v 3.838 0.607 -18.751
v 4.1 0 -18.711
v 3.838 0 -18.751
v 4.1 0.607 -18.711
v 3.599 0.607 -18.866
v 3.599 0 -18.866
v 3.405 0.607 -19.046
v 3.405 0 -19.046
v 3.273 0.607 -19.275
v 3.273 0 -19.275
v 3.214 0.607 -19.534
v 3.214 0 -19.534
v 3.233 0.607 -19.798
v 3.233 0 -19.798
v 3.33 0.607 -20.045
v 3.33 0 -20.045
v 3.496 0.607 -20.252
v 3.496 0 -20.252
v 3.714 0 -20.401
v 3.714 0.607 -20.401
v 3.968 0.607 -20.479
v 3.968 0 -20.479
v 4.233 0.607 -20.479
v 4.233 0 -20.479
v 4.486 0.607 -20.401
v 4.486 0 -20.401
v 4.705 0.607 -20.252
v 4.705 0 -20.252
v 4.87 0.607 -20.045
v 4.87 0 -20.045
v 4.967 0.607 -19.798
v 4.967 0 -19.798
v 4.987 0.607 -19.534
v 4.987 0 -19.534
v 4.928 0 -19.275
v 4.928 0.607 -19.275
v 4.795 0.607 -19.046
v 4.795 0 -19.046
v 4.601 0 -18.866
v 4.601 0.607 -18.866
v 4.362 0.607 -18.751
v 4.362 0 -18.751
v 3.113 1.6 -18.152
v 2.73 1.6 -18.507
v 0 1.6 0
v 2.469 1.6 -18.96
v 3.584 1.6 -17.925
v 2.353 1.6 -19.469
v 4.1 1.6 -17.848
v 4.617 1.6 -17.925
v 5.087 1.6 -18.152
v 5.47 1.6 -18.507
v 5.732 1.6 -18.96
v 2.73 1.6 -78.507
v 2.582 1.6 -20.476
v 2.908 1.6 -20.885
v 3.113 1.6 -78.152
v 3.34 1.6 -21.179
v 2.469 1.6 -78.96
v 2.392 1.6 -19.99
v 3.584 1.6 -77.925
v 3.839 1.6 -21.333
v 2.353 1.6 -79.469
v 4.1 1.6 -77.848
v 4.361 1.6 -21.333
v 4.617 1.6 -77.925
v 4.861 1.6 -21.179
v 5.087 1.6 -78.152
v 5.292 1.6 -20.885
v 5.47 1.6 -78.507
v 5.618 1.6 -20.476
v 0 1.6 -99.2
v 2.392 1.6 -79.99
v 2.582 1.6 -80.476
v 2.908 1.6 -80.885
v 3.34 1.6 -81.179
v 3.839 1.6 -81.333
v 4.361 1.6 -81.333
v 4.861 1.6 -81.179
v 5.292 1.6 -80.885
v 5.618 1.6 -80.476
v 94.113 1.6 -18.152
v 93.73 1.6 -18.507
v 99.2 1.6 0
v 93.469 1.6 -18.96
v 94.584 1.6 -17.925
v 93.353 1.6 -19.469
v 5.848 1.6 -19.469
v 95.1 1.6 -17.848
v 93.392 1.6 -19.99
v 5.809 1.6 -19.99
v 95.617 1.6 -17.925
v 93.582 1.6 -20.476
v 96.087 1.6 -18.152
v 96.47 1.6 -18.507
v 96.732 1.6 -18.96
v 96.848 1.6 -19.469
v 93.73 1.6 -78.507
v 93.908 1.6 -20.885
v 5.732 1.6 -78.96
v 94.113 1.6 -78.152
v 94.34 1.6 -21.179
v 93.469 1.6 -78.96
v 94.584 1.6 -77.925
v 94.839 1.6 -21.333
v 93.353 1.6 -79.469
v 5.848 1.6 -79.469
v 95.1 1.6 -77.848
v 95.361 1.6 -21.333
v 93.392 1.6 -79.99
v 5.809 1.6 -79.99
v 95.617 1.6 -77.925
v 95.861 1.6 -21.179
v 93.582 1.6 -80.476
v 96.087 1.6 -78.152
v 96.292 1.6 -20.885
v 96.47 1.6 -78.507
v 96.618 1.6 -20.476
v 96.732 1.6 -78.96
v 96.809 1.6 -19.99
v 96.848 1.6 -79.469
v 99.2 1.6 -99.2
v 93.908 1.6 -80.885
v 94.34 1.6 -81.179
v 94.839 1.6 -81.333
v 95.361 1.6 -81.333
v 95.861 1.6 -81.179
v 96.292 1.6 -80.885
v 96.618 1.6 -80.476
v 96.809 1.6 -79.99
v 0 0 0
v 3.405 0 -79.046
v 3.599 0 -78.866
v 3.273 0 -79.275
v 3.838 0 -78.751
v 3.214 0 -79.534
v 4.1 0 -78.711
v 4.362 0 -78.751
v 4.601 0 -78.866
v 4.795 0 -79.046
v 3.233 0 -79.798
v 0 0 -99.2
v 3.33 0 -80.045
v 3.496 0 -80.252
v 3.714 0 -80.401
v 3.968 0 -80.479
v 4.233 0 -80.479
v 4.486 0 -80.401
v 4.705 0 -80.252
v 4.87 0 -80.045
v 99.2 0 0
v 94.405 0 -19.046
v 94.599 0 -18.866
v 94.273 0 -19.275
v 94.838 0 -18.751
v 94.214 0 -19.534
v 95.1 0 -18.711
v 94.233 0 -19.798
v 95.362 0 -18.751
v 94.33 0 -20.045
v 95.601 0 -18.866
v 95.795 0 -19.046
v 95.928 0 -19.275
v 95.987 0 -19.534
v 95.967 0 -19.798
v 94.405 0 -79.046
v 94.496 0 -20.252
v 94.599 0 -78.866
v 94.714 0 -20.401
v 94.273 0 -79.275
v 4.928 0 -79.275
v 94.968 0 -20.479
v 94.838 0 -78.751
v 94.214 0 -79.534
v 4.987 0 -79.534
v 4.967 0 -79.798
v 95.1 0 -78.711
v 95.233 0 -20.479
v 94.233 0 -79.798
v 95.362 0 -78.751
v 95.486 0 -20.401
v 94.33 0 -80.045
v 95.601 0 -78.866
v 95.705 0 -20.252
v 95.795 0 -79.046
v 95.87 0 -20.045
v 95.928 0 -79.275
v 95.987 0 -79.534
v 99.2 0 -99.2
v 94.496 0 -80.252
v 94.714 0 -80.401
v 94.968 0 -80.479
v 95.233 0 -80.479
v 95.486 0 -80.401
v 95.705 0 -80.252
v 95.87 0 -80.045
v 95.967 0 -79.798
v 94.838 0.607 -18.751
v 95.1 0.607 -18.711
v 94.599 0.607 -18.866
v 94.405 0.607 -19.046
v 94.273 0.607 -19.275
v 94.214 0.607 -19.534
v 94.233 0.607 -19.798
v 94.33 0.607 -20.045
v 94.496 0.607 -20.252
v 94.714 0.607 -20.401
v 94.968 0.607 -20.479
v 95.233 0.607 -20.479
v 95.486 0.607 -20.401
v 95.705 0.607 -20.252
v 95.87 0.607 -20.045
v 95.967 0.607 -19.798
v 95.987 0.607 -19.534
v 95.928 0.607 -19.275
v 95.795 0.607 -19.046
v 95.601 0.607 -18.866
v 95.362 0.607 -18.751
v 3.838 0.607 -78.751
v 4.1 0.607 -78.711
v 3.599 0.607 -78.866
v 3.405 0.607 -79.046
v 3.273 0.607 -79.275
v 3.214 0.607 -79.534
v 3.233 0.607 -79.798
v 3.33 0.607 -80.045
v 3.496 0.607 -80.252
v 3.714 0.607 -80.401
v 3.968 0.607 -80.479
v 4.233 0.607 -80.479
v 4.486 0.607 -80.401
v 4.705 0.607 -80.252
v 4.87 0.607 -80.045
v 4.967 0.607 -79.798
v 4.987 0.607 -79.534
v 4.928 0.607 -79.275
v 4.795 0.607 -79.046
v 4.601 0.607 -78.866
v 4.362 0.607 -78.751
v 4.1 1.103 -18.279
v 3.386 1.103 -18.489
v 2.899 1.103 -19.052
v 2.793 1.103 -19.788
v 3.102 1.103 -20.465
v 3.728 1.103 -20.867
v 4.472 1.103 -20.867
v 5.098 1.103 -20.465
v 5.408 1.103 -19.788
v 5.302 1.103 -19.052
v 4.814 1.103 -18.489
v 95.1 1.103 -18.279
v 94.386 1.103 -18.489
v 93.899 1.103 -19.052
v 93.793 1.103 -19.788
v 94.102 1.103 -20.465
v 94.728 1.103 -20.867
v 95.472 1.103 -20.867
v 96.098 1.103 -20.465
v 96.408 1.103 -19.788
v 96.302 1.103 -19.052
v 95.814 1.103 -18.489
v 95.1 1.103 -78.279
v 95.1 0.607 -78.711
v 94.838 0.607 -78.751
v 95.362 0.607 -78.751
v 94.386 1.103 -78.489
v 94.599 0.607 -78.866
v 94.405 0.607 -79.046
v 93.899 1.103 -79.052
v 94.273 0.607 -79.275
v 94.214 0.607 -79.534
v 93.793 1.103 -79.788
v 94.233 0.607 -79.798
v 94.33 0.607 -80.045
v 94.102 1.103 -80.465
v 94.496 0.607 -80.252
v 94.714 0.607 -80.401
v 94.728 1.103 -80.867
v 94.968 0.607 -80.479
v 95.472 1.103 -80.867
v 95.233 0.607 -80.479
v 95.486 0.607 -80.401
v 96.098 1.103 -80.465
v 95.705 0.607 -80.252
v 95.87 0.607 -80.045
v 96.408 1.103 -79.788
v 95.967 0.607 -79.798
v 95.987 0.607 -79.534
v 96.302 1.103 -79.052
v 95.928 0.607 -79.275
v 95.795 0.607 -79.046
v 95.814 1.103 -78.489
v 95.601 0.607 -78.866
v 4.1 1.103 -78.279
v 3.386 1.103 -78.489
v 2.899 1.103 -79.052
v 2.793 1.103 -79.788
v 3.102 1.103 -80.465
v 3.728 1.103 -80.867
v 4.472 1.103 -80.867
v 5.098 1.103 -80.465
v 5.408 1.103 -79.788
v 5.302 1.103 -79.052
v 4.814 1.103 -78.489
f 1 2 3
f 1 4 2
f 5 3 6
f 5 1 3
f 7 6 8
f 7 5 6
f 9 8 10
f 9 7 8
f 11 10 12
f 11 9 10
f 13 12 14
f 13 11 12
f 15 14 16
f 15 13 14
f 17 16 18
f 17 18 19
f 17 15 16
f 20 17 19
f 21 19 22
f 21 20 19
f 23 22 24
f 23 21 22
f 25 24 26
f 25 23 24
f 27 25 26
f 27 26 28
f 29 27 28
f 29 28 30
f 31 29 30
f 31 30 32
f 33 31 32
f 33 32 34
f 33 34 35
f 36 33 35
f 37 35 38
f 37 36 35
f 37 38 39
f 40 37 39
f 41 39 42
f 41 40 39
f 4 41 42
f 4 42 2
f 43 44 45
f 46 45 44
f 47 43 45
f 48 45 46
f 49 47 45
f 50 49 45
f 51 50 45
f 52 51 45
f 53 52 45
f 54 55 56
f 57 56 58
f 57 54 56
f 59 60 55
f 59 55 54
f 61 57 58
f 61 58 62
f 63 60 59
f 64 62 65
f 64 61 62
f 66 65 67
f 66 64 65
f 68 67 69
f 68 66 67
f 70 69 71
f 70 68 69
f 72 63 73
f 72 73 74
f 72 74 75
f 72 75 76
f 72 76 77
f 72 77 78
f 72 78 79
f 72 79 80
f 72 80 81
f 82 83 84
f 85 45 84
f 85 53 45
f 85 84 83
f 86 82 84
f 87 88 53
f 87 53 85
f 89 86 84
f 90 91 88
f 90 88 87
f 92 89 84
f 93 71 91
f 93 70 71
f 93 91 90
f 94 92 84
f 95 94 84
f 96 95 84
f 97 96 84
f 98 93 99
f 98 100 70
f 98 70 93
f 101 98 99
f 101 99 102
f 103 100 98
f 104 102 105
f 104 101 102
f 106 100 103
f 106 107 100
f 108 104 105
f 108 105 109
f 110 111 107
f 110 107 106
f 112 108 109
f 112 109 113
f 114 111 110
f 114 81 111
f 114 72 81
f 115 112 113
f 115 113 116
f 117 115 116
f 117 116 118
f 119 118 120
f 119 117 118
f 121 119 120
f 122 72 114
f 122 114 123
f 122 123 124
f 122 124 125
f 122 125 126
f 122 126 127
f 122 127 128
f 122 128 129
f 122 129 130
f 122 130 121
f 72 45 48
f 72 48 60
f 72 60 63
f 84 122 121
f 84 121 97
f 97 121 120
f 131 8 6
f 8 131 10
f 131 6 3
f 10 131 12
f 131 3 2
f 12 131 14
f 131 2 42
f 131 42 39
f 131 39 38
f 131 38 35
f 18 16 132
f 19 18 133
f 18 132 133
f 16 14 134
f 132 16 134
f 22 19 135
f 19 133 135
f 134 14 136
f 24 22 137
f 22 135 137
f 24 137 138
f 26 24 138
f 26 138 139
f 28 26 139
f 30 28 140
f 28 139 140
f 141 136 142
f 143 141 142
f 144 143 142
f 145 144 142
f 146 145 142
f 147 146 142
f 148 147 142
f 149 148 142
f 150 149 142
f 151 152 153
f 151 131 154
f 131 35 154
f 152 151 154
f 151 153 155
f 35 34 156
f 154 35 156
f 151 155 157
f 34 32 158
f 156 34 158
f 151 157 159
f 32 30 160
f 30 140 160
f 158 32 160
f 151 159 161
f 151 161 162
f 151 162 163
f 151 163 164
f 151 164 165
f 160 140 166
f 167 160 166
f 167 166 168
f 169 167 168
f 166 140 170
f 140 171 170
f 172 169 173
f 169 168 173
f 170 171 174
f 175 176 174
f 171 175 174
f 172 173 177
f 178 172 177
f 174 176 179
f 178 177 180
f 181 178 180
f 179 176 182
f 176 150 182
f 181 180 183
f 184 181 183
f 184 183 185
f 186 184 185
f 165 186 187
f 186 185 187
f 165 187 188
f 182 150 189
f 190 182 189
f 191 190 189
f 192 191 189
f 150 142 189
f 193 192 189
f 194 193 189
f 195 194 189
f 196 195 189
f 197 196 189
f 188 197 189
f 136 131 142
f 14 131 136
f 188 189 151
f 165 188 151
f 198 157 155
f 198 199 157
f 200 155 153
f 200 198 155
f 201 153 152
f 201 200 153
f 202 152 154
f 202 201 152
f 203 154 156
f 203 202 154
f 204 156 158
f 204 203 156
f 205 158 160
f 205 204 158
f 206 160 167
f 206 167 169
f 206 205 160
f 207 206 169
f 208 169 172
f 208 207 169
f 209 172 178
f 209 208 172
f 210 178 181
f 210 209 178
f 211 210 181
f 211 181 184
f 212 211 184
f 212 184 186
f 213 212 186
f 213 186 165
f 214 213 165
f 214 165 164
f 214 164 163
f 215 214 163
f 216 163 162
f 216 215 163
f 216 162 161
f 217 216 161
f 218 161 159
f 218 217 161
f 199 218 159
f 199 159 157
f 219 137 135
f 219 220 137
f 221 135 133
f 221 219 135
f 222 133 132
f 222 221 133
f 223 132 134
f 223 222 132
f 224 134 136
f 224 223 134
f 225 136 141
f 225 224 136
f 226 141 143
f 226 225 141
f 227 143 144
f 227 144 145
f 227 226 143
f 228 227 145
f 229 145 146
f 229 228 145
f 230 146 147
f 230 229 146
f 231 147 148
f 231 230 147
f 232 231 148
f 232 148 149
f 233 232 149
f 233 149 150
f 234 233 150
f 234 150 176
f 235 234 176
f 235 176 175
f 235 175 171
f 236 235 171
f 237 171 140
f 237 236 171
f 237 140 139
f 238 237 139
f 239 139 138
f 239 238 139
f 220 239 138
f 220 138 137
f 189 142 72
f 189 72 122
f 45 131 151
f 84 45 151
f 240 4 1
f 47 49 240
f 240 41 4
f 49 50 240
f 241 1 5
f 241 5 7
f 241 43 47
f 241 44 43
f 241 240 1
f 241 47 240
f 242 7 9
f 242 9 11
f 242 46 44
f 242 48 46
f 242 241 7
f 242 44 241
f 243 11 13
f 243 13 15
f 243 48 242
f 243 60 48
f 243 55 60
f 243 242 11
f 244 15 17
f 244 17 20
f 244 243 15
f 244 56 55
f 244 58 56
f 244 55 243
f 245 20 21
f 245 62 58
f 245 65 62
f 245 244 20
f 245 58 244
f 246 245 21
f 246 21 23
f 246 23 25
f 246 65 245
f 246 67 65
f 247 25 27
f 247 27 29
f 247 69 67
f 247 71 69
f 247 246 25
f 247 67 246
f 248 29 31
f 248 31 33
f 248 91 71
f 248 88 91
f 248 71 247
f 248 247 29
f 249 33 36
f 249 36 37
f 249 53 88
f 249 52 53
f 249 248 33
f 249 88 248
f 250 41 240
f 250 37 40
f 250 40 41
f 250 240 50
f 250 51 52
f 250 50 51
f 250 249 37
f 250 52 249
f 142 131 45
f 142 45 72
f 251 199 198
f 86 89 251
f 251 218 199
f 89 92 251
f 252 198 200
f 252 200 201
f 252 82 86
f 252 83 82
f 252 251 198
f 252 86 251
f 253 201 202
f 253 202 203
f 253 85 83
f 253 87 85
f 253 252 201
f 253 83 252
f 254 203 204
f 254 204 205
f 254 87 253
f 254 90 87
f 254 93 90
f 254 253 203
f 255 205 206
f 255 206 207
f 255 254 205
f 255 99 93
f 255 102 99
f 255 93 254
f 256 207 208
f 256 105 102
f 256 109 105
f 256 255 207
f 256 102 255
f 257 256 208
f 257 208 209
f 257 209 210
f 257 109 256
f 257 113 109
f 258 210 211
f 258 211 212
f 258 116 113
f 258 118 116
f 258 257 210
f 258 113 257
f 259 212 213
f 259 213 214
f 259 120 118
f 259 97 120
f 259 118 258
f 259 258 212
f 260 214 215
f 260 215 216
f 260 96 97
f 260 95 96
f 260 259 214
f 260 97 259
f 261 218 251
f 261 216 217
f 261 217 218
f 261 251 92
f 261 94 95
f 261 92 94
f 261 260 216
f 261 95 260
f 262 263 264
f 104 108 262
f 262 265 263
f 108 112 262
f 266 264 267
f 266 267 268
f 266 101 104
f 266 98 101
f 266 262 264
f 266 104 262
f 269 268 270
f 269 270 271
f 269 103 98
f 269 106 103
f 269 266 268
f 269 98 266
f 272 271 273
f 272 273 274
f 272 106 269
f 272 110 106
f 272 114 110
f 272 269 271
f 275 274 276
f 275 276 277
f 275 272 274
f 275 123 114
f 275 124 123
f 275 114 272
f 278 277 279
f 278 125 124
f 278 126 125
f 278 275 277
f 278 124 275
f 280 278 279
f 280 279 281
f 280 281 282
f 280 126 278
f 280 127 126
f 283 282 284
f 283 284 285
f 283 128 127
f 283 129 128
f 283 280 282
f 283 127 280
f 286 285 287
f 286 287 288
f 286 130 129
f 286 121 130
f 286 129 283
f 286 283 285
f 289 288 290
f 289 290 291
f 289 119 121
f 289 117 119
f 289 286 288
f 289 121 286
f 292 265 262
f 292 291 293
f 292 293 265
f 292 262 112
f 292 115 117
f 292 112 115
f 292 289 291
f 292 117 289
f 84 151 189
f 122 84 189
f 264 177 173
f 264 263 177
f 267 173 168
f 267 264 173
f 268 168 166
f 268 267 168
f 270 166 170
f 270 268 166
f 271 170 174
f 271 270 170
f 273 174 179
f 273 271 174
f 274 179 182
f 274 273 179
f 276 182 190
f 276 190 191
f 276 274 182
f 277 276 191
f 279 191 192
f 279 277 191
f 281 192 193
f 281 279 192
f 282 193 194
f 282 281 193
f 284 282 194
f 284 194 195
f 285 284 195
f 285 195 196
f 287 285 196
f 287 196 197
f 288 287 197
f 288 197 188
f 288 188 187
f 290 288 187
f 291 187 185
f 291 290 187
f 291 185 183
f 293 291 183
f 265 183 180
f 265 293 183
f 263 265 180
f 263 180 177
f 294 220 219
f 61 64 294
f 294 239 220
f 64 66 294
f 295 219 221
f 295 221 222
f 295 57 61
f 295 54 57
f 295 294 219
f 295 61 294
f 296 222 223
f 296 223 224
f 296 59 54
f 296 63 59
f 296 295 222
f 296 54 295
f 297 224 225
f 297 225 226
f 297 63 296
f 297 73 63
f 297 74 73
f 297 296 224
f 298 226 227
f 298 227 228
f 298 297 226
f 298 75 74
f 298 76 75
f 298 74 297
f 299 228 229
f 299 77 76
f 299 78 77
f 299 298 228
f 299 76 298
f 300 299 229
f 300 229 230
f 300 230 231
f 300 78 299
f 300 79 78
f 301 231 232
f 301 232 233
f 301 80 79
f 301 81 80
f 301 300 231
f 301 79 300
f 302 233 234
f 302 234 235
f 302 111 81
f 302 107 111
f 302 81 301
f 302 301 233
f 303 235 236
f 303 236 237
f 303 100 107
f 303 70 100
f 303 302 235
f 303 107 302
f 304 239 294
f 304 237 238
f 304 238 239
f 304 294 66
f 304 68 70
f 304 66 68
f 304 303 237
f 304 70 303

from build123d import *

# Parameters (mm, degrees)
SKETCH1_W                                     = 99.2004
SKETCH1_H                                     = 99.2004
BOSS_EXTRUDE1_DEPTH                           = 1.6002
CSK_FOR_0_FLAT_HEAD_SOCKET_CAP_SCREW1_A_COUNT = 2
CSK_FOR_0_FLAT_HEAD_SOCKET_CAP_SCREW1_A_PITCH = 60
CSK_FOR_0_FLAT_HEAD_SOCKET_CAP_SCRE_2_COUNT   = 2
CSK_FOR_0_FLAT_HEAD_SOCKET_CAP_SCRE_2_PITCH   = 109
CSK_FOR_0_FLAT_HEAD_SOCKET_CAP_SCRE_3_COUNT   = 2
CSK_FOR_0_FLAT_HEAD_SOCKET_CAP_SCRE_3_PITCH   = 91


with BuildPart() as part:
    # Sketch1 → Boss-Extrude1 (new body)
    with BuildSketch(Plane(origin=(0, 0, 0), x_dir=(1, 0, 0), z_dir=(0, 1, 0))):
        with Locations((49.6002, 49.6002)):
            Rectangle(SKETCH1_W, SKETCH1_H)
    extrude(amount=BOSS_EXTRUDE1_DEPTH)

    # Sketch5 → CSK for #0 Flat Head Socket Cap Screw1 (revolve, cut)
    with BuildSketch(Plane(origin=(4.1002, 1.6002, -79.6002), x_dir=(0, 0, 1), z_dir=(1, 0, 0))):
        Polygon((0, 0), (0, 1.6002), (0.889, 1.6002), (0.889, 0.993458156), (1.7526, 0), align=None)
    csk_for_0_flat_head_socket_cap_screw1 = revolve(axis=Axis((4.1002, 7.9502, -79.6002), (0, -1, 0)), mode=Mode.SUBTRACT)

    # CSK for #0 Flat Head Socket Cap Screw1 a: CSK for #0 Flat Head Socket Cap Screw1 ×2
    with Locations(*[(0, 0, i * CSK_FOR_0_FLAT_HEAD_SOCKET_CAP_SCREW1_A_PITCH) for i in range(1, CSK_FOR_0_FLAT_HEAD_SOCKET_CAP_SCREW1_A_COUNT)]):
        add(csk_for_0_flat_head_socket_cap_screw1, mode=Mode.SUBTRACT)

    # CSK for _0 Flat Head Socket Cap Scre 2: CSK for #0 Flat Head Socket Cap Screw1 ×2
    with Locations(*[Vector(0.834862385, 0, 0.550458716) * (i * CSK_FOR_0_FLAT_HEAD_SOCKET_CAP_SCRE_2_PITCH) for i in range(1, CSK_FOR_0_FLAT_HEAD_SOCKET_CAP_SCRE_2_COUNT)]):
        add(csk_for_0_flat_head_socket_cap_screw1, mode=Mode.SUBTRACT)

    # CSK for _0 Flat Head Socket Cap Scre 3: CSK for #0 Flat Head Socket Cap Screw1 ×2
    with Locations(*[(i * CSK_FOR_0_FLAT_HEAD_SOCKET_CAP_SCRE_3_PITCH, 0, 0) for i in range(1, CSK_FOR_0_FLAT_HEAD_SOCKET_CAP_SCRE_3_COUNT)]):
        add(csk_for_0_flat_head_socket_cap_screw1, mode=Mode.SUBTRACT)


solid = part.part
